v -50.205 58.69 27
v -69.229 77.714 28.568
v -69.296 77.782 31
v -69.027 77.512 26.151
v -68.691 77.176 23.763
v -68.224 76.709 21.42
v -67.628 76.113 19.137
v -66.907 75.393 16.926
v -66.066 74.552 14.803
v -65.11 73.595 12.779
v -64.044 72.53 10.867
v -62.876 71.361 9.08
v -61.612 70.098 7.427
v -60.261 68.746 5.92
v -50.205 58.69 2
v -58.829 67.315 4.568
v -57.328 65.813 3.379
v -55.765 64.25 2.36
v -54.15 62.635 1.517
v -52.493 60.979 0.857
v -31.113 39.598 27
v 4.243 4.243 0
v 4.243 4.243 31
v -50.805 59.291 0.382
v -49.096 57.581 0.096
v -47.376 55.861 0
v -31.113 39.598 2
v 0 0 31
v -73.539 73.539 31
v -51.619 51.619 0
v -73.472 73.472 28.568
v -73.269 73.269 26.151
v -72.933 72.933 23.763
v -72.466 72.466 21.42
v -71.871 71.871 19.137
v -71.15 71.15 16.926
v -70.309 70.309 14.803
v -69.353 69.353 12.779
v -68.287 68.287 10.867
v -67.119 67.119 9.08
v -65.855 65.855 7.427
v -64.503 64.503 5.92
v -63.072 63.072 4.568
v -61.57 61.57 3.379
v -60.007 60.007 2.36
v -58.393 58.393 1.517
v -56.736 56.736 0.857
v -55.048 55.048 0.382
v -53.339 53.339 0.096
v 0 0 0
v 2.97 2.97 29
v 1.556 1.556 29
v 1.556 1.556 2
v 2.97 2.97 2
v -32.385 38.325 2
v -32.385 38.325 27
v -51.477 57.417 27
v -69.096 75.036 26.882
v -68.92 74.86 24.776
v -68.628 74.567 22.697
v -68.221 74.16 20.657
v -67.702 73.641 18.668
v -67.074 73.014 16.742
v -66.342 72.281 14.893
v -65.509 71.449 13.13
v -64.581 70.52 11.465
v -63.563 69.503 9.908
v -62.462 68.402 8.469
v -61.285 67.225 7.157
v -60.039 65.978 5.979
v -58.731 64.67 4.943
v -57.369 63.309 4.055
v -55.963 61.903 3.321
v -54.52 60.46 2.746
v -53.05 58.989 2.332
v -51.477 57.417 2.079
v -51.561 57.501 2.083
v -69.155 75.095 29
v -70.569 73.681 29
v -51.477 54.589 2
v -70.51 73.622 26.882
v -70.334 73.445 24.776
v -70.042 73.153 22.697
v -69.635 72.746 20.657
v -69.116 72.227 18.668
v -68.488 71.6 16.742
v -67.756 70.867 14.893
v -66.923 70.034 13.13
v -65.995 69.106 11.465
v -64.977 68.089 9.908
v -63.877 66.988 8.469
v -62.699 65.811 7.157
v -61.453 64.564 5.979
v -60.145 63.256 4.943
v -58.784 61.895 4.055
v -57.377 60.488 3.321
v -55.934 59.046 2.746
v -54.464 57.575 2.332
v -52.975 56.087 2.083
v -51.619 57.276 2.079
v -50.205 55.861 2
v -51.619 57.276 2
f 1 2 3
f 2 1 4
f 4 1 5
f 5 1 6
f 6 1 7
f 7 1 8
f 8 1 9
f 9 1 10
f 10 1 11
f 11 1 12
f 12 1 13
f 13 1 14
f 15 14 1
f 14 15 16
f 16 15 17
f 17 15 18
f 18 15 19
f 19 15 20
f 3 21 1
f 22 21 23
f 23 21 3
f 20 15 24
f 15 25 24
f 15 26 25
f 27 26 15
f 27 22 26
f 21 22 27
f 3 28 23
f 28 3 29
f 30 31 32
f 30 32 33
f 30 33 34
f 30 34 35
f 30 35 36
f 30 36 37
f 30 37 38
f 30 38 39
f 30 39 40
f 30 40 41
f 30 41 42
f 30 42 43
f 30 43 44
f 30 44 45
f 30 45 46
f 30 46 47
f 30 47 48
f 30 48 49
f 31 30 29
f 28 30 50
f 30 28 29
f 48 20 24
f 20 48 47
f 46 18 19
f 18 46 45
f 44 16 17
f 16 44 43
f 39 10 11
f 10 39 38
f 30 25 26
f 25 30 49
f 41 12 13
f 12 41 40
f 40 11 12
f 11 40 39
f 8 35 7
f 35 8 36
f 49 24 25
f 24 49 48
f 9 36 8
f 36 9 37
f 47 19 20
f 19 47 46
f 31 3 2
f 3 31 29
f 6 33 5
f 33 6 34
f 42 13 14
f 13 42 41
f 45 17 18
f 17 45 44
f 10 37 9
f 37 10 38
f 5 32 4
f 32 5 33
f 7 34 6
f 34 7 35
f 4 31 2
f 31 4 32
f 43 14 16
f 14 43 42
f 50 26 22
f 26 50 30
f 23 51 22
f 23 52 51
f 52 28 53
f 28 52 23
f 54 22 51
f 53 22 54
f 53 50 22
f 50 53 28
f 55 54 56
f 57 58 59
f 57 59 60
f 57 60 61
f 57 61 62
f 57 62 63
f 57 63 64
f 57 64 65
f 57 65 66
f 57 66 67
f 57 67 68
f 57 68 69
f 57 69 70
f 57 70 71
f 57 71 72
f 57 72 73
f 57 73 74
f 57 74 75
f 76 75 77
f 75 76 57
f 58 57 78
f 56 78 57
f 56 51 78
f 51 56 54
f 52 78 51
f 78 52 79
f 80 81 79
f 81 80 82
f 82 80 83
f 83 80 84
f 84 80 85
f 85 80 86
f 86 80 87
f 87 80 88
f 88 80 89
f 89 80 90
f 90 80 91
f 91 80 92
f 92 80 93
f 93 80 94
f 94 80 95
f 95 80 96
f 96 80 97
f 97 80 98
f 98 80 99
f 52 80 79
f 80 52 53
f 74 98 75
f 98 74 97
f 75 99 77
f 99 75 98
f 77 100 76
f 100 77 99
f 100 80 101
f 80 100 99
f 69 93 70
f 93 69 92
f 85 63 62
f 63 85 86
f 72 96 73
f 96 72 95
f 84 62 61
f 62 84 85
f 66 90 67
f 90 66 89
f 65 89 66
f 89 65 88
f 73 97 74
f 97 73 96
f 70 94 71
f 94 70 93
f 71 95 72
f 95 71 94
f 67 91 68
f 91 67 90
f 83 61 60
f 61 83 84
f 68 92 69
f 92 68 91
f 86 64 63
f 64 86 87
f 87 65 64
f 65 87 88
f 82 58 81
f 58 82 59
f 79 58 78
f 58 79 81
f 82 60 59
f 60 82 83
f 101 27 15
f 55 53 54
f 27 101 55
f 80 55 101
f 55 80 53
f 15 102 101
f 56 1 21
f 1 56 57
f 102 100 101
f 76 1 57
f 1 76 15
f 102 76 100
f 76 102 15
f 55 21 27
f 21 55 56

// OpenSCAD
// parametric knife sheath

// length: the length of the blade from handle to tip
// maxwidth: the maximum width of the blade
// tipwidth:  the width near the tip, zero means it comes to a point
// thickness: maximum thickness of the blade
// show:  0 = do not put a window to show the blade style
//
// all measurements are in mm

//CUSTOMIZER VARIABLES

//	Knife length, mm
knife_length = 100;	//	[25:350]

//	Knife Max Blade width, mm
knife_width = 25;	//	[10:100]

//	Knife thickness, mm
knife_thickness = 2.0;	//	[1:5]

// Show knife through window?
knife_show = 1; // [0:No, 1:Yes]

//CUSTOMIZER VARIABLES END

$fn = 80*1;  // while debugging reduce this to 20 to save time

wall = 2*1;
pad = 2*1;

rotate([0,0,45])
	parasheath(length=knife_length, maxwidth=knife_width, thickness=knife_thickness, show=knife_show);


module parasheath(length=200, maxwidth=25, thickness=2, show=1) {

	difference() {

		// first make an oversized blade, oversized by 2 times the wall thickness

		blade(len=length+wall+pad,maxwid=maxwidth+pad+2*wall,thick=thickness+2*wall);

		translate([wall+0.2,-0.1,wall]) 
			blade(len=length+0.1+pad, maxwid=maxwidth+pad, thick=thickness);

		if (show) {
			translate([thickness+wall,length-2*maxwidth,wall]) 
			 		cube([100,wall+maxwidth,maxwidth]);
		}
	}

}

module blade(len=200, maxwid=25, tipwid=5, thick=2) {

	union() {
		intersection() {
				// first make a cube
				cube([thick, len, maxwid]);
	
				translate([0,len-maxwid,maxwid]) 
					rotate([0,90,0]) 
						cylinder(r=maxwid,h=thick*3,center=true);
		}

		cube([thick,len-maxwid,maxwid]);
	}
}
